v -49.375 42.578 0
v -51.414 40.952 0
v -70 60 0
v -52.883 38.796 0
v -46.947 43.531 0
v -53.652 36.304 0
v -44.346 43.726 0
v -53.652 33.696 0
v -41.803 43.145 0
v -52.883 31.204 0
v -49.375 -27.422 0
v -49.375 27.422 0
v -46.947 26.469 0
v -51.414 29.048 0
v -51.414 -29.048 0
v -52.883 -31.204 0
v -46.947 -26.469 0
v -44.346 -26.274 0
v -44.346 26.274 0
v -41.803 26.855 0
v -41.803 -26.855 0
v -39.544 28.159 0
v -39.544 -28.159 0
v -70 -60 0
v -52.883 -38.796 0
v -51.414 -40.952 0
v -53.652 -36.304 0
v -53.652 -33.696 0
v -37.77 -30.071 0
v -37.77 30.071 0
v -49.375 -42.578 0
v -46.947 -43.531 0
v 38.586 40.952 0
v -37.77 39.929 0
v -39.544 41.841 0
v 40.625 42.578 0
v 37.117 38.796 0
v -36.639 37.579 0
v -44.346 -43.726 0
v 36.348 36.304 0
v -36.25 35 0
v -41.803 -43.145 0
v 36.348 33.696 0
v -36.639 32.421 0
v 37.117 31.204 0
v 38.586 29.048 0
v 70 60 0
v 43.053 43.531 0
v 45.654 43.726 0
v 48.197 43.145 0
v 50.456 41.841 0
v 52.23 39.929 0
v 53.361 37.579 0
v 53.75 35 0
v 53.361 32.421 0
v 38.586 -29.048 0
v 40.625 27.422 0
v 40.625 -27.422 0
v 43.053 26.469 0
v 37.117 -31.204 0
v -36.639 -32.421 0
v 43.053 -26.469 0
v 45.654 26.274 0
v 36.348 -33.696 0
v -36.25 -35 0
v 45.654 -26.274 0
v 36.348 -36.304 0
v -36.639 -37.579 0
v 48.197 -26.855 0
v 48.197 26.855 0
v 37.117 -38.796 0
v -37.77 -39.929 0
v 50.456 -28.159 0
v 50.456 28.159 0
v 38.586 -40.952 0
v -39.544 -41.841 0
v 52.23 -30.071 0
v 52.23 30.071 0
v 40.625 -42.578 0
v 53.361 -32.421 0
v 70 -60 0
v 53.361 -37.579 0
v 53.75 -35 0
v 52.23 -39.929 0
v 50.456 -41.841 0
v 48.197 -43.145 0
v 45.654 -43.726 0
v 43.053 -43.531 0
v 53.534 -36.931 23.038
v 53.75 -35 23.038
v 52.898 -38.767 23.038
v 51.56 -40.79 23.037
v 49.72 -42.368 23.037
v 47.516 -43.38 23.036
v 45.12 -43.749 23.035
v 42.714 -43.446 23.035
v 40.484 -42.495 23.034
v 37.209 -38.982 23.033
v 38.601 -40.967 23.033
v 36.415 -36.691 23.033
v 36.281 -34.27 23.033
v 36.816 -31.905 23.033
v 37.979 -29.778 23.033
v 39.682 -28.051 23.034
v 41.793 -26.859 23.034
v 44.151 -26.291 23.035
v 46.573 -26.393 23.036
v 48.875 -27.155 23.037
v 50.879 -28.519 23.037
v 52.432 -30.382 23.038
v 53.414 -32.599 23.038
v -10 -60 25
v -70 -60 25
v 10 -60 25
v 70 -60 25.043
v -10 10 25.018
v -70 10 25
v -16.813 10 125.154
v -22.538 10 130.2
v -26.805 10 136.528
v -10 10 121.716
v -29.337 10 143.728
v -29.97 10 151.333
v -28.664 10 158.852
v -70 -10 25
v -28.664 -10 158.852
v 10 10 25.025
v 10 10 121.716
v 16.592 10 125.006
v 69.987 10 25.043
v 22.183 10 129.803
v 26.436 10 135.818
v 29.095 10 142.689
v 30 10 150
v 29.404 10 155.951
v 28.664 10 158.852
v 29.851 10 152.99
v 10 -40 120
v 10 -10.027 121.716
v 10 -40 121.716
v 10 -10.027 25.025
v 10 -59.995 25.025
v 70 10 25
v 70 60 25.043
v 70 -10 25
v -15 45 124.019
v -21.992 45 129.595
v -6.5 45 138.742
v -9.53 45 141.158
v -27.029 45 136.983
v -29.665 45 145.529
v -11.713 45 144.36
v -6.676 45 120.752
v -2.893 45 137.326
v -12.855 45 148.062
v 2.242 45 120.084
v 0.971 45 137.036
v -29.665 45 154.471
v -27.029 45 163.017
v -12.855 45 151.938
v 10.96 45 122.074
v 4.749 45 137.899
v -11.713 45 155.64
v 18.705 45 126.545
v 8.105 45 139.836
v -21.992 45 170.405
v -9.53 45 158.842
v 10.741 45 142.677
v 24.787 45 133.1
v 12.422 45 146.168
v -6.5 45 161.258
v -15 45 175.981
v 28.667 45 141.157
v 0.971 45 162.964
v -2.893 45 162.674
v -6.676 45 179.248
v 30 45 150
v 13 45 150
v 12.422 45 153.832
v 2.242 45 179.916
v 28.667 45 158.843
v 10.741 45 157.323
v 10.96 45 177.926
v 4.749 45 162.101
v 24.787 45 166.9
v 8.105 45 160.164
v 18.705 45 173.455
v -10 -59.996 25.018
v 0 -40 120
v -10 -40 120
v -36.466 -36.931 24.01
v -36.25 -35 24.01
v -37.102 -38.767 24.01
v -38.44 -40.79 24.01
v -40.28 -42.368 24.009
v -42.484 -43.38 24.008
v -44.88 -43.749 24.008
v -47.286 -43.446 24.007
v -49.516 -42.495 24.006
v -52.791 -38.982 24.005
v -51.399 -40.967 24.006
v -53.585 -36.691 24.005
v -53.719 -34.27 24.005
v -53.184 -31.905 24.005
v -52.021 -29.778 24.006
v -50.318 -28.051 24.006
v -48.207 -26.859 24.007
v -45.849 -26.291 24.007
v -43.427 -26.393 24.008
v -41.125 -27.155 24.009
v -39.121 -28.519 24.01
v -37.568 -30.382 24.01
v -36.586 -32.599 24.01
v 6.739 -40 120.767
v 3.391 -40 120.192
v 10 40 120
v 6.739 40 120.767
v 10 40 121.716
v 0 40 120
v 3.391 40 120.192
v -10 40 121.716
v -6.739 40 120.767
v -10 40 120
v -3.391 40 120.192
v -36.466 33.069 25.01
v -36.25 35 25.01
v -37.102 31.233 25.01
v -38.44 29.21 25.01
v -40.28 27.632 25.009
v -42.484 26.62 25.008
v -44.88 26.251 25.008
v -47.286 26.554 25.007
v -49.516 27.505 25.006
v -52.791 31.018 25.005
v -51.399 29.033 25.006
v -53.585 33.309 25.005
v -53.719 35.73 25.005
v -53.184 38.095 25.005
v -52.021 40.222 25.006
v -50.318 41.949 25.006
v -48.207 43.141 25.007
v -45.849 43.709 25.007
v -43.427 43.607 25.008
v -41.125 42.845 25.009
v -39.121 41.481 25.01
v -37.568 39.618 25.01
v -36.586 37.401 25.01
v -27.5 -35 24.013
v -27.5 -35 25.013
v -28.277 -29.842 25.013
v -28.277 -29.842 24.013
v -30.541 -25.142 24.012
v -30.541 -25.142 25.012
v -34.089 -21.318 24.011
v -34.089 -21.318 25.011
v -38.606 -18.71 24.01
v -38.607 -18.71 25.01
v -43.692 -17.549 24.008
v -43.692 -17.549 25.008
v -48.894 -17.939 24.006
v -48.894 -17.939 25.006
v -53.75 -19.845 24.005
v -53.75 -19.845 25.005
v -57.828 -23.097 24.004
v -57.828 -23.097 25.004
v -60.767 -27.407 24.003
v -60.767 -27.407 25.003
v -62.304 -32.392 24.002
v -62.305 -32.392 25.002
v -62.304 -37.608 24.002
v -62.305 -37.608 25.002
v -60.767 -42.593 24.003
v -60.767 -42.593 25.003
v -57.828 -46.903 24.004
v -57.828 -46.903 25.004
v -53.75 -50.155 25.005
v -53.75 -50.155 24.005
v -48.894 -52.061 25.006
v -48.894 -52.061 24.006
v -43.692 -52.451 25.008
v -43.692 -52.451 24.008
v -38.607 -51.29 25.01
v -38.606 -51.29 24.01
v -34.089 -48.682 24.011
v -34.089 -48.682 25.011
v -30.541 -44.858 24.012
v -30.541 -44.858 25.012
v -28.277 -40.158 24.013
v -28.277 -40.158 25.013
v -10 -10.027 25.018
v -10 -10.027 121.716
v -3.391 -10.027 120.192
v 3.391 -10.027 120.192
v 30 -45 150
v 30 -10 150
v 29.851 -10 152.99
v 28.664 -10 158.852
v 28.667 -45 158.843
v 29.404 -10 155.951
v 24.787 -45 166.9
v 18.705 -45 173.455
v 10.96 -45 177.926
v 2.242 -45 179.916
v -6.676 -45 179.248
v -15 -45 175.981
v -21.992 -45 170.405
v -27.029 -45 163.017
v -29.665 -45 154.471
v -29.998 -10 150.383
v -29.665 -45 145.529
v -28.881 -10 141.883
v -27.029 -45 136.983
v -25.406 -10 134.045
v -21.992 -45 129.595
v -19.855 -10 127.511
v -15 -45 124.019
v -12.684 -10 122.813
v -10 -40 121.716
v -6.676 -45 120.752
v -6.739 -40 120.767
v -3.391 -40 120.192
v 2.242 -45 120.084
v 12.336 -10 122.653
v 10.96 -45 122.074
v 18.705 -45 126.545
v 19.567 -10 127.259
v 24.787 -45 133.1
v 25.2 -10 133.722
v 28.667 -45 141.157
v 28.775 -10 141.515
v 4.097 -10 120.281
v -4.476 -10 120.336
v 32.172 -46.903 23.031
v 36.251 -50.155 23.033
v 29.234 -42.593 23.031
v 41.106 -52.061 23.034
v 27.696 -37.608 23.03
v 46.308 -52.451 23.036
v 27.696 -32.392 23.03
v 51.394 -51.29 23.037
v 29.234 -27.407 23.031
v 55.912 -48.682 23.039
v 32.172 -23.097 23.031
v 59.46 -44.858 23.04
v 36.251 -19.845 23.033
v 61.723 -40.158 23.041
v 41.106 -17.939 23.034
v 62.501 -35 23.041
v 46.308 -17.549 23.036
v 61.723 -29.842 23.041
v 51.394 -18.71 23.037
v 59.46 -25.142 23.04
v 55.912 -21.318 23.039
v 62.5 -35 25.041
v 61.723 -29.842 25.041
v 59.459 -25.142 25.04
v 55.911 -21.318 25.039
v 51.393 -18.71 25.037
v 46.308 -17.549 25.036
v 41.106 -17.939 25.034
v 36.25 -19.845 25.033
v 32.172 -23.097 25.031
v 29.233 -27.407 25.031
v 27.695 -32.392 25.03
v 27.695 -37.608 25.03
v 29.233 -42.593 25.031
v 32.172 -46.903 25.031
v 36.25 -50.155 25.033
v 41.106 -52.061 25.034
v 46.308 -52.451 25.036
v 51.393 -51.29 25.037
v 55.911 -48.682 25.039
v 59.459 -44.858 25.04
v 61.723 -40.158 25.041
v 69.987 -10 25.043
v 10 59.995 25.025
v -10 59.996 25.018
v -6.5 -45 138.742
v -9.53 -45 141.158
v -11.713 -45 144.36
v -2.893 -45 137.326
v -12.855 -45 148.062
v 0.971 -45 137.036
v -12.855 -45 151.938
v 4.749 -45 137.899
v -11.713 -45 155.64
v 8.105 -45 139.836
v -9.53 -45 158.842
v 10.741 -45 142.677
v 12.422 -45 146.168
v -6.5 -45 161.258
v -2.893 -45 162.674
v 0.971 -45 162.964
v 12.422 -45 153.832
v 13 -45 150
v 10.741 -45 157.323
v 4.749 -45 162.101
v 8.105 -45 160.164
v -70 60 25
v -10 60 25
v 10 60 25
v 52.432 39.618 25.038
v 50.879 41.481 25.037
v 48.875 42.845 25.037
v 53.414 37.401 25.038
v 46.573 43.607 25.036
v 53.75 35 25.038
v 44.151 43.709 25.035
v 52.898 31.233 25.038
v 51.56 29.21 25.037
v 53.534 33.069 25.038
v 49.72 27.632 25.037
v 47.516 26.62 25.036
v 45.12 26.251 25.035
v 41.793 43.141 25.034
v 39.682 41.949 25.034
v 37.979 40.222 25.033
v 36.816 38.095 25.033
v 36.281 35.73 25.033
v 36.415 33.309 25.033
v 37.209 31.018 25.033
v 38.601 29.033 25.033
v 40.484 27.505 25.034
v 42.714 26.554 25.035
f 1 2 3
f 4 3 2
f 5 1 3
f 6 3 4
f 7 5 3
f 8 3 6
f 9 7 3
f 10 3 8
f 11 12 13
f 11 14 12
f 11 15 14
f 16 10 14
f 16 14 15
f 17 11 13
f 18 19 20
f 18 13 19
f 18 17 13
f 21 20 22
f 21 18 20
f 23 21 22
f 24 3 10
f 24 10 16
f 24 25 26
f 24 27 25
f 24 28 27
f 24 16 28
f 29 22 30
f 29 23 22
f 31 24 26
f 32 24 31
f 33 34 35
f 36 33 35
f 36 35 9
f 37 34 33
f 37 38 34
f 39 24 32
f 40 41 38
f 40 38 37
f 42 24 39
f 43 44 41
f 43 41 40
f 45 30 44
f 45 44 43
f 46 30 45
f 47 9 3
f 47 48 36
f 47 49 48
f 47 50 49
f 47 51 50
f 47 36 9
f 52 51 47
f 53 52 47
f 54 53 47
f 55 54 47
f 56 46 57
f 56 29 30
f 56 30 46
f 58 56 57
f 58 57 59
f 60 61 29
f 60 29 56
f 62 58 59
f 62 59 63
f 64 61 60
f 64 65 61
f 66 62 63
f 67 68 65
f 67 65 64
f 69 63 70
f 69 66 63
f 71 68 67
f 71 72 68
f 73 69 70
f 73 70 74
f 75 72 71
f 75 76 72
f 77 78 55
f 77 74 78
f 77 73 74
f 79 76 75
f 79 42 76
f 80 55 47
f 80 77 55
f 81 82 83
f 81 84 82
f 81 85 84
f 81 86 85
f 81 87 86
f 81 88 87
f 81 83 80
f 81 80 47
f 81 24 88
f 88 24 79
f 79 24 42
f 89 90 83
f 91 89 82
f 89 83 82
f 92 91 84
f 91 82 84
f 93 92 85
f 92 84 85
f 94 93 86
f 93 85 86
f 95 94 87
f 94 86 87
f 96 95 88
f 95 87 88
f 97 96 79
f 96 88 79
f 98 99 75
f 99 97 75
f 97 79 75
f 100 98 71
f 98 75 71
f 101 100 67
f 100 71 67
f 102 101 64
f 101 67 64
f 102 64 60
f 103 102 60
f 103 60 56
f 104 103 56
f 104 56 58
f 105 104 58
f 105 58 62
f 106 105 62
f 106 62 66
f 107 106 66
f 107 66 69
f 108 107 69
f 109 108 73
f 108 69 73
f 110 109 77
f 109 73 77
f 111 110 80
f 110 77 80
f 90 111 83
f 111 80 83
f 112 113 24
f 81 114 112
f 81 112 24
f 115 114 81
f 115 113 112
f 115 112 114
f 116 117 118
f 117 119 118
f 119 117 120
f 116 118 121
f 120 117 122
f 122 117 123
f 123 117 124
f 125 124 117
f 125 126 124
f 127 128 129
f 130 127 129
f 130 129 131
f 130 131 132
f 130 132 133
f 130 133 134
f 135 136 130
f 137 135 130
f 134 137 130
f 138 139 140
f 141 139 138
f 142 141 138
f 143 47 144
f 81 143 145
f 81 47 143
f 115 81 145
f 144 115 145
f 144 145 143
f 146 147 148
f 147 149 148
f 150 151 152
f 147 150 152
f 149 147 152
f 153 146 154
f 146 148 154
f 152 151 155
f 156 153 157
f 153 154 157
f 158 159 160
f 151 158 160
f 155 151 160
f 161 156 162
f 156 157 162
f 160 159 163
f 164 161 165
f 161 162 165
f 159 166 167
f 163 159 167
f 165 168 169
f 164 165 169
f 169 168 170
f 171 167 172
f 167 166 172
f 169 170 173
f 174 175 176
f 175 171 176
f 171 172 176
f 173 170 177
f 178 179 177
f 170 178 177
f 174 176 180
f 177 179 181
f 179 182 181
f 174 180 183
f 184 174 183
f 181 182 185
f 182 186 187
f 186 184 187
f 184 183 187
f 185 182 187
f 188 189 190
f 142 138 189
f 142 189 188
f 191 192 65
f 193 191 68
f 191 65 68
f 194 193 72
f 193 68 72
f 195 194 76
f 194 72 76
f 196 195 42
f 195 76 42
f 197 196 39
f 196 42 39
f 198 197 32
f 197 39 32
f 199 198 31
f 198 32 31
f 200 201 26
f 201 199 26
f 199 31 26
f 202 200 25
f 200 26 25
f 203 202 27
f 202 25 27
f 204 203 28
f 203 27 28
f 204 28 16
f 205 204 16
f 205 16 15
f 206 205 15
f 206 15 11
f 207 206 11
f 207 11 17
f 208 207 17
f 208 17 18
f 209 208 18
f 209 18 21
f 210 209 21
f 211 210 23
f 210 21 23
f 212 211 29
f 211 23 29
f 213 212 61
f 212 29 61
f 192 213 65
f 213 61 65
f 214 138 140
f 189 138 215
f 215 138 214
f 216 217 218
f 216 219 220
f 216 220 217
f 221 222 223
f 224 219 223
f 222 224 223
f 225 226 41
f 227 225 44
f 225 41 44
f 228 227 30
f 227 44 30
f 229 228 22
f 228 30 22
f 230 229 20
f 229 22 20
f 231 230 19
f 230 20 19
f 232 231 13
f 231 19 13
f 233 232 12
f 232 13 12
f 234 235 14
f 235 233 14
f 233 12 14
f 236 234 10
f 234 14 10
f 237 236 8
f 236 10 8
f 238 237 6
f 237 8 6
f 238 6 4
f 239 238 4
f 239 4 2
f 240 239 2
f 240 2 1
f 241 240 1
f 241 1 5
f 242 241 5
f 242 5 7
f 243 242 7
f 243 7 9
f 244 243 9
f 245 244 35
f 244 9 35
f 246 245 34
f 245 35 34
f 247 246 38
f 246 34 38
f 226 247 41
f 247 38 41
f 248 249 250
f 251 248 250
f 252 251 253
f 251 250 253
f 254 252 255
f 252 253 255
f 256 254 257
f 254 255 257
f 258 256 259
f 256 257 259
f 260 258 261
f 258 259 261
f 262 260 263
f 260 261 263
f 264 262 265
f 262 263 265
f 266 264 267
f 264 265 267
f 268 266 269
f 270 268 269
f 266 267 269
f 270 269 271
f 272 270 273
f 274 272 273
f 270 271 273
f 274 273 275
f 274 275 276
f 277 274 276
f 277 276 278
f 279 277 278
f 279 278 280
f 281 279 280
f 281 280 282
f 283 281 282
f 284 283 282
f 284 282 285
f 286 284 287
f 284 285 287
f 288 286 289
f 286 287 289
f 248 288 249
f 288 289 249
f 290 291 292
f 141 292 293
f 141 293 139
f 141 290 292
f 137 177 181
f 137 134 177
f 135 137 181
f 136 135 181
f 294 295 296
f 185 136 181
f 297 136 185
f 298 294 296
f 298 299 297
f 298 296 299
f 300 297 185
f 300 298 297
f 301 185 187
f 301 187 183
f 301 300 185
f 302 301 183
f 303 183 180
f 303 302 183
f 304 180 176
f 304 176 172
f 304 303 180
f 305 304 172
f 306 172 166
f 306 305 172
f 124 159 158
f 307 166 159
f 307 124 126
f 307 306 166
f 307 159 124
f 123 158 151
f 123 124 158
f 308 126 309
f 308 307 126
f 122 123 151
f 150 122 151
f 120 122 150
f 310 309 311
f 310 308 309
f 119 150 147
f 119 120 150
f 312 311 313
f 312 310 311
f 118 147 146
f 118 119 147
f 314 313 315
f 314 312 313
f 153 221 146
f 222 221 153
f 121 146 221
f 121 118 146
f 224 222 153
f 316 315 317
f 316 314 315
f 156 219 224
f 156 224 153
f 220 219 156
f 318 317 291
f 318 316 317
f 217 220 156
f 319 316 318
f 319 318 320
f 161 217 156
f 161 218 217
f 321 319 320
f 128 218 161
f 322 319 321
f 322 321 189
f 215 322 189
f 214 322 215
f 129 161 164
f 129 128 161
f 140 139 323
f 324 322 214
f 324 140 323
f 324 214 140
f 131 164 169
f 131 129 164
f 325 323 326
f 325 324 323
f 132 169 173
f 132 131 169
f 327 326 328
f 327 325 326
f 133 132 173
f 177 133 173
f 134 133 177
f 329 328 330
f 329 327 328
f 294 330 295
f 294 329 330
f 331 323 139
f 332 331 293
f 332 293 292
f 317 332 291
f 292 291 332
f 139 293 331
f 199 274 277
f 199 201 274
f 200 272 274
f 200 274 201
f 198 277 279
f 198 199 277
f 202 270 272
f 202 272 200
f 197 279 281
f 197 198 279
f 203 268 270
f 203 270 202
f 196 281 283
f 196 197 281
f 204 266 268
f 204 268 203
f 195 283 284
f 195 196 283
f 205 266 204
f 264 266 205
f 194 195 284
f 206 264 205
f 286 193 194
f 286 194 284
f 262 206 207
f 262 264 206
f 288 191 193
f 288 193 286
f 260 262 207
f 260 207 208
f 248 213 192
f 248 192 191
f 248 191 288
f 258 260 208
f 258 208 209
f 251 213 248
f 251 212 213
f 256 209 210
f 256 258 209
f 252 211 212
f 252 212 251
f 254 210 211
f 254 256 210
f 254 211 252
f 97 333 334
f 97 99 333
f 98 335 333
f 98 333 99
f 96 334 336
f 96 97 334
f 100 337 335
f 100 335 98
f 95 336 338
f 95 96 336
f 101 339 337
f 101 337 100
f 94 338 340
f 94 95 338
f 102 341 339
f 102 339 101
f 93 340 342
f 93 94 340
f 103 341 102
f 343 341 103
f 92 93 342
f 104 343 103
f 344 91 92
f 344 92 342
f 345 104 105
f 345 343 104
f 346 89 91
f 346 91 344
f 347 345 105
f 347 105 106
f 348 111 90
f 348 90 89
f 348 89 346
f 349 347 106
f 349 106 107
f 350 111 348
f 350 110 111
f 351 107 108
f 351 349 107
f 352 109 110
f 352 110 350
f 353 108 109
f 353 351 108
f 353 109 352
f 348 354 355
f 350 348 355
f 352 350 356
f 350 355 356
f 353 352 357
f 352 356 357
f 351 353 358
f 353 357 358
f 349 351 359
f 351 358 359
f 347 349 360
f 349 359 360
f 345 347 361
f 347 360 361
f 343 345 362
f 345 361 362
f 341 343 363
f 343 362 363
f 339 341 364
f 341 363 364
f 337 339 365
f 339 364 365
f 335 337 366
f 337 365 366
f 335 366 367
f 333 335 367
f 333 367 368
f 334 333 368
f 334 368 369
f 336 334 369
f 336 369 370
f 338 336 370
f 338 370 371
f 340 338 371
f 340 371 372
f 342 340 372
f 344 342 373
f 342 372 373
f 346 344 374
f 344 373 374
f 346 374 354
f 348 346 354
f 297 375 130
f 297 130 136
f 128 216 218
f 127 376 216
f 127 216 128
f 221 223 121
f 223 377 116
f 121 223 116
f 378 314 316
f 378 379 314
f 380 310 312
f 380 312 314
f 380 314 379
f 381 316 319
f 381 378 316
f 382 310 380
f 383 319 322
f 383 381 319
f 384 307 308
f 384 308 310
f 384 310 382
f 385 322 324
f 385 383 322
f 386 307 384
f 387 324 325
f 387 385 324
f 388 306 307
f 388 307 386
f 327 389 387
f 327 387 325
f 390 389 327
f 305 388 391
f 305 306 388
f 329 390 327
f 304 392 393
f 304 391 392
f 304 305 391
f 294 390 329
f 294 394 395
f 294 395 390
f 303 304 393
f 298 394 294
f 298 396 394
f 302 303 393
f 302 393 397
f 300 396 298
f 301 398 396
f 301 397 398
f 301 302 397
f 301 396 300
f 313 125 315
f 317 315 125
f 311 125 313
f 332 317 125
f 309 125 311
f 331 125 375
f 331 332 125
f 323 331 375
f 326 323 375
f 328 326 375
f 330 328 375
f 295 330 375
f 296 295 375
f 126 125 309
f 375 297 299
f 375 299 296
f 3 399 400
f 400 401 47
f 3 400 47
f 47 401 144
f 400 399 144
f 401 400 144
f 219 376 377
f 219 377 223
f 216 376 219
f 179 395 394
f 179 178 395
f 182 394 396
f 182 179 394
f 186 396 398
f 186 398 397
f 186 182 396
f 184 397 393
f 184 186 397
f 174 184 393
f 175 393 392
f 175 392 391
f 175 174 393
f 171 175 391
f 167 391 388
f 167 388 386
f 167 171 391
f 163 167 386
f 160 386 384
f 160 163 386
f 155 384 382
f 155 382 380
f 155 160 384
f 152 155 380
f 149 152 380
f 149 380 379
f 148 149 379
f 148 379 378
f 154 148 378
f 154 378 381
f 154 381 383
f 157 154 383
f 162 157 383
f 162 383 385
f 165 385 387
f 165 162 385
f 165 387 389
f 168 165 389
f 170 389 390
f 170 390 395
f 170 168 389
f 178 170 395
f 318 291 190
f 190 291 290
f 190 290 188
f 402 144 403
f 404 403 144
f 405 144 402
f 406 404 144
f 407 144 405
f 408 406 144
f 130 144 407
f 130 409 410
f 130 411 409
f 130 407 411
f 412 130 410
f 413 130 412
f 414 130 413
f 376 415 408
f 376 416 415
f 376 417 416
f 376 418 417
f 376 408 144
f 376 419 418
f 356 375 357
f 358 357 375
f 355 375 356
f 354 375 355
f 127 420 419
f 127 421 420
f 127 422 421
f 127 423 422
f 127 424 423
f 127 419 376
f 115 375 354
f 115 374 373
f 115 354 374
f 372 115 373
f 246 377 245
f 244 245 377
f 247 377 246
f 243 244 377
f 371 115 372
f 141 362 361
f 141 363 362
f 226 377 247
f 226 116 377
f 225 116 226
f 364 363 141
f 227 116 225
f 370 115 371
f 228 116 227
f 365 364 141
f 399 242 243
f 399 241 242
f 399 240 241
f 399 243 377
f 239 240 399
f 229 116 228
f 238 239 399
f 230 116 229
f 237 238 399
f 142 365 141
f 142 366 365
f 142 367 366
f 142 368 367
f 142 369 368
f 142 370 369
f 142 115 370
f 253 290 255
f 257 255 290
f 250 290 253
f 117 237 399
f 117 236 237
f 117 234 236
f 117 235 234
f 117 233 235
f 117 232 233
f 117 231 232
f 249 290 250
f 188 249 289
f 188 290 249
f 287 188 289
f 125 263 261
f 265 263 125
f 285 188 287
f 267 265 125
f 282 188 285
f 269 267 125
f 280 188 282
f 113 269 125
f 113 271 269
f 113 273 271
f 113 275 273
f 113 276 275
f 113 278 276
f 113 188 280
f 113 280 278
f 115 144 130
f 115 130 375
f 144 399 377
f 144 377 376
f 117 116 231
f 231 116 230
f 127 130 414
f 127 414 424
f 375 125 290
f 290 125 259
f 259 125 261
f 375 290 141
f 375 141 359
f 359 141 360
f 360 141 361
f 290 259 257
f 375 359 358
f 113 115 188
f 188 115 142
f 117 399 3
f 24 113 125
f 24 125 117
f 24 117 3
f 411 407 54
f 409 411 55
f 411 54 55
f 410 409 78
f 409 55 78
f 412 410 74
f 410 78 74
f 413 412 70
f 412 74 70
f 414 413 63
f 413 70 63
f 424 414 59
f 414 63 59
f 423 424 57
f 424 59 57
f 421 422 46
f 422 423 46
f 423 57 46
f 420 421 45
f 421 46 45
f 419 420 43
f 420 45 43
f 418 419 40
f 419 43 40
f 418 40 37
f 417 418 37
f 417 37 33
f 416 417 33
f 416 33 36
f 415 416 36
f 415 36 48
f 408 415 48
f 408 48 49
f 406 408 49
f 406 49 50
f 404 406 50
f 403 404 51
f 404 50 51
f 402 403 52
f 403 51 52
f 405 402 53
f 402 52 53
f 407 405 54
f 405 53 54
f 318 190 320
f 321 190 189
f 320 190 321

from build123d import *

# Parameters (mm, degrees)
F1_DEPTH  = 10
F3_DEPTH  = 60
F4_R      = 30
F4_R_2    = 13
F5_DEPTH  = 45
F7_DEPTH  = 10
F8_DEPTH  = 10
F9_DEPTH  = 5
F10_DEPTH = 5
F11_R     = 8.75
F12_DEPTH = 50
F13_R     = 17.5
F14_DEPTH = 1
F15_R     = 17.5
F16_DEPTH = 2


# Not quite as in the source:
# - a pattern or mirror of a feature is missing from the dataset's text; its kind, count and spacing are read off the source's solid


with BuildPart() as f1:
    # F0 (on Front) → F1 (new body, symmetric)
    with BuildSketch(Plane.XZ):
        with BuildLine():
            Line((-28.6642979162, 158.8520068331), (-70, 25))
            Line((-70, 25), (70, 25))
            Line((70, 25), (28.6642979162, 158.8520068331))
            ThreePointArc((28.6642979162, 158.8520068331), (29.6641950631, 154.4761067075), (30, 150))
            ThreePointArc((30, 150), (-4.4761067075, 120.3358049369), (-28.6642979162, 158.8520068331))
        make_face()
    extrude(amount=F1_DEPTH, both=True)

    # F2 (on Front) → F3 (join, symmetric)
    with BuildSketch(Plane.XZ):
        Polygon((70, 0), (70, 25.0431130097), (-70, 25), (-70, 0), align=None)
    extrude(amount=F3_DEPTH, both=True)

    # F4 (on Front) → F5 (join, symmetric)
    with BuildSketch(Plane.XZ):
        with Locations((0, 150)):
            Circle(F4_R)
        with Locations((0, 150)):
            Circle(F4_R_2, mode=Mode.SUBTRACT)
    extrude(amount=F5_DEPTH, both=True)

    # F6 (on Right) → F7 (join, symmetric)
    with BuildSketch(Plane.YZ):
        Polygon((60, 25), (40, 120), (10, 120), (10, 25), align=None)
    extrude(amount=F7_DEPTH, both=True)

    # F6 (on Right) → F8, piece 2 (join, symmetric)
    with BuildSketch(Plane.YZ):
        Polygon((-40, 120), (-60, 25), (-10.027478449, 25), (-10.027478449, 120), align=None)
    extrude(amount=F8_DEPTH, both=True)

    # F9 (add): a face of the model
    f9_faces = [f1.faces().sort_by_distance(p)[0] for p in [
        (5, 25, 120),
    ]]


with BuildPart() as f8:
    # F6 (on Right) → F8 (new body, symmetric)
    with BuildSketch(Plane.YZ):
        Polygon((60, 25), (40, 120), (10, 120), (10, 25), align=None)
    extrude(amount=F8_DEPTH, both=True)


with BuildPart() as f1_1:
    add(f1.part)

    add(f8.part)  # F9 merges F8
    f9 = extrude(f9_faces, amount=F9_DEPTH)

    # F9_copies: F9 across plane
    add(f9.mirror(Plane(origin=(0, 0, 0), x_dir=(0, 0, -1), z_dir=(-1, 0, 0))))

    # F10 (add): a face of the model
    f10_faces = [f1_1.faces().sort_by_distance(p)[0] for p in [
        (5, -25.0137392245, 120),
    ]]
    f10 = extrude(f10_faces, amount=F10_DEPTH)

    # F10_copies: F10 across plane
    add(f10.mirror(Plane(origin=(0, 0, 0), x_dir=(0, 0, -1), z_dir=(-1, 0, 0))))

    # F11 (on face) → F12 (cut)
    with BuildSketch(Plane(origin=(0, 0, 0), x_dir=(1, 0, 0), z_dir=(0, 0, -1))):
        with Locations((-45, -35)):
            Circle(F11_R)
        with Locations((-45, 35)):
            Circle(F11_R)
        with Locations((45, -35)):
            Circle(F11_R)
        with Locations((45, 35)):
            Circle(F11_R)
    extrude(amount=-F12_DEPTH, mode=Mode.SUBTRACT)

    # F13 (on face) → F14 (cut)
    with BuildSketch(Plane(origin=(-0.0077053893, 0, 25.021554132), x_dir=(0.9999999526, 0, 0.0003079501), z_dir=(-0.0003079501, 0, 0.9999999526))):
        with Locations((-44.992296744, -35)):
            Circle(F13_R)
        with BuildLine():
            add(Edge.make_bspline(
                [(-36.2422963292, -35), (-36.2422963292, -19.8445554338), (-49.3672969515, -27.4222777169), (-62.4922975738, -35), (-49.3672969515, -42.5777222831), (-36.2422963292, -50.1554445662), (-36.2422963292, -35)],
                knots=[3.1415926536, 3.1415926536, 3.1415926536, 5.235987756, 5.235987756, 7.3303828584, 7.3303828584, 9.4247779608, 9.4247779608, 9.4247779608], degree=2, weights=[1, 0.5, 1, 0.5, 1, 0.5, 1]))
        make_face(mode=Mode.SUBTRACT)
        with BuildLine():
            add(Edge.make_bspline(
                [(53.7577079383, -35), (53.7577079383, -19.8445554338), (40.632707316, -27.4222777169), (27.5077066937, -35), (40.632707316, -42.5777222831), (53.7577079383, -50.1554445662), (53.7577079383, -35)],
                knots=[3.1415926536, 3.1415926536, 3.1415926536, 5.235987756, 5.235987756, 7.3303828584, 7.3303828584, 9.4247779608, 9.4247779608, 9.4247779608], degree=2, weights=[1, 0.5, 1, 0.5, 1, 0.5, 1]))
        make_face()
        with BuildLine():
            add(Edge.make_bspline(
                [(-36.2422963292, -35), (-36.2422963292, -19.8445554338), (-49.3672969515, -27.4222777169), (-62.4922975738, -35), (-49.3672969515, -42.5777222831), (-36.2422963292, -50.1554445662), (-36.2422963292, -35)],
                knots=[3.1415926536, 3.1415926536, 3.1415926536, 5.235987756, 5.235987756, 7.3303828584, 7.3303828584, 9.4247779608, 9.4247779608, 9.4247779608], degree=2, weights=[1, 0.5, 1, 0.5, 1, 0.5, 1]))
        make_face()
    extrude(amount=-F14_DEPTH, mode=Mode.SUBTRACT)

    # F15 (on face) → F16 (cut)
    with BuildSketch(Plane(origin=(-0.0077053893, 0, 25.021554132), x_dir=(0.9999999526, 0, 0.0003079501), z_dir=(-0.0003079501, 0, 0.9999999526))):
        with Locations((45.0077075234, -35)):
            Circle(F15_R)
        with BuildLine():
            add(Edge.make_bspline(
                [(53.7577079383, -35), (53.7577079383, -19.8445554338), (40.632707316, -27.4222777169), (27.5077066937, -35), (40.632707316, -42.5777222831), (53.7577079383, -50.1554445662), (53.7577079383, -35)],
                knots=[3.1415926536, 3.1415926536, 3.1415926536, 5.235987756, 5.235987756, 7.3303828584, 7.3303828584, 9.4247779608, 9.4247779608, 9.4247779608], degree=2, weights=[1, 0.5, 1, 0.5, 1, 0.5, 1]))
        make_face(mode=Mode.SUBTRACT)
        with BuildLine():
            add(Edge.make_bspline(
                [(53.7577079383, -35), (53.7577079383, -19.8445554338), (40.632707316, -27.4222777169), (27.5077066937, -35), (40.632707316, -42.5777222831), (53.7577079383, -50.1554445662), (53.7577079383, -35)],
                knots=[3.1415926536, 3.1415926536, 3.1415926536, 5.235987756, 5.235987756, 7.3303828584, 7.3303828584, 9.4247779608, 9.4247779608, 9.4247779608], degree=2, weights=[1, 0.5, 1, 0.5, 1, 0.5, 1]))
        make_face()
    extrude(amount=-F16_DEPTH, mode=Mode.SUBTRACT)


solid = f1_1.part
